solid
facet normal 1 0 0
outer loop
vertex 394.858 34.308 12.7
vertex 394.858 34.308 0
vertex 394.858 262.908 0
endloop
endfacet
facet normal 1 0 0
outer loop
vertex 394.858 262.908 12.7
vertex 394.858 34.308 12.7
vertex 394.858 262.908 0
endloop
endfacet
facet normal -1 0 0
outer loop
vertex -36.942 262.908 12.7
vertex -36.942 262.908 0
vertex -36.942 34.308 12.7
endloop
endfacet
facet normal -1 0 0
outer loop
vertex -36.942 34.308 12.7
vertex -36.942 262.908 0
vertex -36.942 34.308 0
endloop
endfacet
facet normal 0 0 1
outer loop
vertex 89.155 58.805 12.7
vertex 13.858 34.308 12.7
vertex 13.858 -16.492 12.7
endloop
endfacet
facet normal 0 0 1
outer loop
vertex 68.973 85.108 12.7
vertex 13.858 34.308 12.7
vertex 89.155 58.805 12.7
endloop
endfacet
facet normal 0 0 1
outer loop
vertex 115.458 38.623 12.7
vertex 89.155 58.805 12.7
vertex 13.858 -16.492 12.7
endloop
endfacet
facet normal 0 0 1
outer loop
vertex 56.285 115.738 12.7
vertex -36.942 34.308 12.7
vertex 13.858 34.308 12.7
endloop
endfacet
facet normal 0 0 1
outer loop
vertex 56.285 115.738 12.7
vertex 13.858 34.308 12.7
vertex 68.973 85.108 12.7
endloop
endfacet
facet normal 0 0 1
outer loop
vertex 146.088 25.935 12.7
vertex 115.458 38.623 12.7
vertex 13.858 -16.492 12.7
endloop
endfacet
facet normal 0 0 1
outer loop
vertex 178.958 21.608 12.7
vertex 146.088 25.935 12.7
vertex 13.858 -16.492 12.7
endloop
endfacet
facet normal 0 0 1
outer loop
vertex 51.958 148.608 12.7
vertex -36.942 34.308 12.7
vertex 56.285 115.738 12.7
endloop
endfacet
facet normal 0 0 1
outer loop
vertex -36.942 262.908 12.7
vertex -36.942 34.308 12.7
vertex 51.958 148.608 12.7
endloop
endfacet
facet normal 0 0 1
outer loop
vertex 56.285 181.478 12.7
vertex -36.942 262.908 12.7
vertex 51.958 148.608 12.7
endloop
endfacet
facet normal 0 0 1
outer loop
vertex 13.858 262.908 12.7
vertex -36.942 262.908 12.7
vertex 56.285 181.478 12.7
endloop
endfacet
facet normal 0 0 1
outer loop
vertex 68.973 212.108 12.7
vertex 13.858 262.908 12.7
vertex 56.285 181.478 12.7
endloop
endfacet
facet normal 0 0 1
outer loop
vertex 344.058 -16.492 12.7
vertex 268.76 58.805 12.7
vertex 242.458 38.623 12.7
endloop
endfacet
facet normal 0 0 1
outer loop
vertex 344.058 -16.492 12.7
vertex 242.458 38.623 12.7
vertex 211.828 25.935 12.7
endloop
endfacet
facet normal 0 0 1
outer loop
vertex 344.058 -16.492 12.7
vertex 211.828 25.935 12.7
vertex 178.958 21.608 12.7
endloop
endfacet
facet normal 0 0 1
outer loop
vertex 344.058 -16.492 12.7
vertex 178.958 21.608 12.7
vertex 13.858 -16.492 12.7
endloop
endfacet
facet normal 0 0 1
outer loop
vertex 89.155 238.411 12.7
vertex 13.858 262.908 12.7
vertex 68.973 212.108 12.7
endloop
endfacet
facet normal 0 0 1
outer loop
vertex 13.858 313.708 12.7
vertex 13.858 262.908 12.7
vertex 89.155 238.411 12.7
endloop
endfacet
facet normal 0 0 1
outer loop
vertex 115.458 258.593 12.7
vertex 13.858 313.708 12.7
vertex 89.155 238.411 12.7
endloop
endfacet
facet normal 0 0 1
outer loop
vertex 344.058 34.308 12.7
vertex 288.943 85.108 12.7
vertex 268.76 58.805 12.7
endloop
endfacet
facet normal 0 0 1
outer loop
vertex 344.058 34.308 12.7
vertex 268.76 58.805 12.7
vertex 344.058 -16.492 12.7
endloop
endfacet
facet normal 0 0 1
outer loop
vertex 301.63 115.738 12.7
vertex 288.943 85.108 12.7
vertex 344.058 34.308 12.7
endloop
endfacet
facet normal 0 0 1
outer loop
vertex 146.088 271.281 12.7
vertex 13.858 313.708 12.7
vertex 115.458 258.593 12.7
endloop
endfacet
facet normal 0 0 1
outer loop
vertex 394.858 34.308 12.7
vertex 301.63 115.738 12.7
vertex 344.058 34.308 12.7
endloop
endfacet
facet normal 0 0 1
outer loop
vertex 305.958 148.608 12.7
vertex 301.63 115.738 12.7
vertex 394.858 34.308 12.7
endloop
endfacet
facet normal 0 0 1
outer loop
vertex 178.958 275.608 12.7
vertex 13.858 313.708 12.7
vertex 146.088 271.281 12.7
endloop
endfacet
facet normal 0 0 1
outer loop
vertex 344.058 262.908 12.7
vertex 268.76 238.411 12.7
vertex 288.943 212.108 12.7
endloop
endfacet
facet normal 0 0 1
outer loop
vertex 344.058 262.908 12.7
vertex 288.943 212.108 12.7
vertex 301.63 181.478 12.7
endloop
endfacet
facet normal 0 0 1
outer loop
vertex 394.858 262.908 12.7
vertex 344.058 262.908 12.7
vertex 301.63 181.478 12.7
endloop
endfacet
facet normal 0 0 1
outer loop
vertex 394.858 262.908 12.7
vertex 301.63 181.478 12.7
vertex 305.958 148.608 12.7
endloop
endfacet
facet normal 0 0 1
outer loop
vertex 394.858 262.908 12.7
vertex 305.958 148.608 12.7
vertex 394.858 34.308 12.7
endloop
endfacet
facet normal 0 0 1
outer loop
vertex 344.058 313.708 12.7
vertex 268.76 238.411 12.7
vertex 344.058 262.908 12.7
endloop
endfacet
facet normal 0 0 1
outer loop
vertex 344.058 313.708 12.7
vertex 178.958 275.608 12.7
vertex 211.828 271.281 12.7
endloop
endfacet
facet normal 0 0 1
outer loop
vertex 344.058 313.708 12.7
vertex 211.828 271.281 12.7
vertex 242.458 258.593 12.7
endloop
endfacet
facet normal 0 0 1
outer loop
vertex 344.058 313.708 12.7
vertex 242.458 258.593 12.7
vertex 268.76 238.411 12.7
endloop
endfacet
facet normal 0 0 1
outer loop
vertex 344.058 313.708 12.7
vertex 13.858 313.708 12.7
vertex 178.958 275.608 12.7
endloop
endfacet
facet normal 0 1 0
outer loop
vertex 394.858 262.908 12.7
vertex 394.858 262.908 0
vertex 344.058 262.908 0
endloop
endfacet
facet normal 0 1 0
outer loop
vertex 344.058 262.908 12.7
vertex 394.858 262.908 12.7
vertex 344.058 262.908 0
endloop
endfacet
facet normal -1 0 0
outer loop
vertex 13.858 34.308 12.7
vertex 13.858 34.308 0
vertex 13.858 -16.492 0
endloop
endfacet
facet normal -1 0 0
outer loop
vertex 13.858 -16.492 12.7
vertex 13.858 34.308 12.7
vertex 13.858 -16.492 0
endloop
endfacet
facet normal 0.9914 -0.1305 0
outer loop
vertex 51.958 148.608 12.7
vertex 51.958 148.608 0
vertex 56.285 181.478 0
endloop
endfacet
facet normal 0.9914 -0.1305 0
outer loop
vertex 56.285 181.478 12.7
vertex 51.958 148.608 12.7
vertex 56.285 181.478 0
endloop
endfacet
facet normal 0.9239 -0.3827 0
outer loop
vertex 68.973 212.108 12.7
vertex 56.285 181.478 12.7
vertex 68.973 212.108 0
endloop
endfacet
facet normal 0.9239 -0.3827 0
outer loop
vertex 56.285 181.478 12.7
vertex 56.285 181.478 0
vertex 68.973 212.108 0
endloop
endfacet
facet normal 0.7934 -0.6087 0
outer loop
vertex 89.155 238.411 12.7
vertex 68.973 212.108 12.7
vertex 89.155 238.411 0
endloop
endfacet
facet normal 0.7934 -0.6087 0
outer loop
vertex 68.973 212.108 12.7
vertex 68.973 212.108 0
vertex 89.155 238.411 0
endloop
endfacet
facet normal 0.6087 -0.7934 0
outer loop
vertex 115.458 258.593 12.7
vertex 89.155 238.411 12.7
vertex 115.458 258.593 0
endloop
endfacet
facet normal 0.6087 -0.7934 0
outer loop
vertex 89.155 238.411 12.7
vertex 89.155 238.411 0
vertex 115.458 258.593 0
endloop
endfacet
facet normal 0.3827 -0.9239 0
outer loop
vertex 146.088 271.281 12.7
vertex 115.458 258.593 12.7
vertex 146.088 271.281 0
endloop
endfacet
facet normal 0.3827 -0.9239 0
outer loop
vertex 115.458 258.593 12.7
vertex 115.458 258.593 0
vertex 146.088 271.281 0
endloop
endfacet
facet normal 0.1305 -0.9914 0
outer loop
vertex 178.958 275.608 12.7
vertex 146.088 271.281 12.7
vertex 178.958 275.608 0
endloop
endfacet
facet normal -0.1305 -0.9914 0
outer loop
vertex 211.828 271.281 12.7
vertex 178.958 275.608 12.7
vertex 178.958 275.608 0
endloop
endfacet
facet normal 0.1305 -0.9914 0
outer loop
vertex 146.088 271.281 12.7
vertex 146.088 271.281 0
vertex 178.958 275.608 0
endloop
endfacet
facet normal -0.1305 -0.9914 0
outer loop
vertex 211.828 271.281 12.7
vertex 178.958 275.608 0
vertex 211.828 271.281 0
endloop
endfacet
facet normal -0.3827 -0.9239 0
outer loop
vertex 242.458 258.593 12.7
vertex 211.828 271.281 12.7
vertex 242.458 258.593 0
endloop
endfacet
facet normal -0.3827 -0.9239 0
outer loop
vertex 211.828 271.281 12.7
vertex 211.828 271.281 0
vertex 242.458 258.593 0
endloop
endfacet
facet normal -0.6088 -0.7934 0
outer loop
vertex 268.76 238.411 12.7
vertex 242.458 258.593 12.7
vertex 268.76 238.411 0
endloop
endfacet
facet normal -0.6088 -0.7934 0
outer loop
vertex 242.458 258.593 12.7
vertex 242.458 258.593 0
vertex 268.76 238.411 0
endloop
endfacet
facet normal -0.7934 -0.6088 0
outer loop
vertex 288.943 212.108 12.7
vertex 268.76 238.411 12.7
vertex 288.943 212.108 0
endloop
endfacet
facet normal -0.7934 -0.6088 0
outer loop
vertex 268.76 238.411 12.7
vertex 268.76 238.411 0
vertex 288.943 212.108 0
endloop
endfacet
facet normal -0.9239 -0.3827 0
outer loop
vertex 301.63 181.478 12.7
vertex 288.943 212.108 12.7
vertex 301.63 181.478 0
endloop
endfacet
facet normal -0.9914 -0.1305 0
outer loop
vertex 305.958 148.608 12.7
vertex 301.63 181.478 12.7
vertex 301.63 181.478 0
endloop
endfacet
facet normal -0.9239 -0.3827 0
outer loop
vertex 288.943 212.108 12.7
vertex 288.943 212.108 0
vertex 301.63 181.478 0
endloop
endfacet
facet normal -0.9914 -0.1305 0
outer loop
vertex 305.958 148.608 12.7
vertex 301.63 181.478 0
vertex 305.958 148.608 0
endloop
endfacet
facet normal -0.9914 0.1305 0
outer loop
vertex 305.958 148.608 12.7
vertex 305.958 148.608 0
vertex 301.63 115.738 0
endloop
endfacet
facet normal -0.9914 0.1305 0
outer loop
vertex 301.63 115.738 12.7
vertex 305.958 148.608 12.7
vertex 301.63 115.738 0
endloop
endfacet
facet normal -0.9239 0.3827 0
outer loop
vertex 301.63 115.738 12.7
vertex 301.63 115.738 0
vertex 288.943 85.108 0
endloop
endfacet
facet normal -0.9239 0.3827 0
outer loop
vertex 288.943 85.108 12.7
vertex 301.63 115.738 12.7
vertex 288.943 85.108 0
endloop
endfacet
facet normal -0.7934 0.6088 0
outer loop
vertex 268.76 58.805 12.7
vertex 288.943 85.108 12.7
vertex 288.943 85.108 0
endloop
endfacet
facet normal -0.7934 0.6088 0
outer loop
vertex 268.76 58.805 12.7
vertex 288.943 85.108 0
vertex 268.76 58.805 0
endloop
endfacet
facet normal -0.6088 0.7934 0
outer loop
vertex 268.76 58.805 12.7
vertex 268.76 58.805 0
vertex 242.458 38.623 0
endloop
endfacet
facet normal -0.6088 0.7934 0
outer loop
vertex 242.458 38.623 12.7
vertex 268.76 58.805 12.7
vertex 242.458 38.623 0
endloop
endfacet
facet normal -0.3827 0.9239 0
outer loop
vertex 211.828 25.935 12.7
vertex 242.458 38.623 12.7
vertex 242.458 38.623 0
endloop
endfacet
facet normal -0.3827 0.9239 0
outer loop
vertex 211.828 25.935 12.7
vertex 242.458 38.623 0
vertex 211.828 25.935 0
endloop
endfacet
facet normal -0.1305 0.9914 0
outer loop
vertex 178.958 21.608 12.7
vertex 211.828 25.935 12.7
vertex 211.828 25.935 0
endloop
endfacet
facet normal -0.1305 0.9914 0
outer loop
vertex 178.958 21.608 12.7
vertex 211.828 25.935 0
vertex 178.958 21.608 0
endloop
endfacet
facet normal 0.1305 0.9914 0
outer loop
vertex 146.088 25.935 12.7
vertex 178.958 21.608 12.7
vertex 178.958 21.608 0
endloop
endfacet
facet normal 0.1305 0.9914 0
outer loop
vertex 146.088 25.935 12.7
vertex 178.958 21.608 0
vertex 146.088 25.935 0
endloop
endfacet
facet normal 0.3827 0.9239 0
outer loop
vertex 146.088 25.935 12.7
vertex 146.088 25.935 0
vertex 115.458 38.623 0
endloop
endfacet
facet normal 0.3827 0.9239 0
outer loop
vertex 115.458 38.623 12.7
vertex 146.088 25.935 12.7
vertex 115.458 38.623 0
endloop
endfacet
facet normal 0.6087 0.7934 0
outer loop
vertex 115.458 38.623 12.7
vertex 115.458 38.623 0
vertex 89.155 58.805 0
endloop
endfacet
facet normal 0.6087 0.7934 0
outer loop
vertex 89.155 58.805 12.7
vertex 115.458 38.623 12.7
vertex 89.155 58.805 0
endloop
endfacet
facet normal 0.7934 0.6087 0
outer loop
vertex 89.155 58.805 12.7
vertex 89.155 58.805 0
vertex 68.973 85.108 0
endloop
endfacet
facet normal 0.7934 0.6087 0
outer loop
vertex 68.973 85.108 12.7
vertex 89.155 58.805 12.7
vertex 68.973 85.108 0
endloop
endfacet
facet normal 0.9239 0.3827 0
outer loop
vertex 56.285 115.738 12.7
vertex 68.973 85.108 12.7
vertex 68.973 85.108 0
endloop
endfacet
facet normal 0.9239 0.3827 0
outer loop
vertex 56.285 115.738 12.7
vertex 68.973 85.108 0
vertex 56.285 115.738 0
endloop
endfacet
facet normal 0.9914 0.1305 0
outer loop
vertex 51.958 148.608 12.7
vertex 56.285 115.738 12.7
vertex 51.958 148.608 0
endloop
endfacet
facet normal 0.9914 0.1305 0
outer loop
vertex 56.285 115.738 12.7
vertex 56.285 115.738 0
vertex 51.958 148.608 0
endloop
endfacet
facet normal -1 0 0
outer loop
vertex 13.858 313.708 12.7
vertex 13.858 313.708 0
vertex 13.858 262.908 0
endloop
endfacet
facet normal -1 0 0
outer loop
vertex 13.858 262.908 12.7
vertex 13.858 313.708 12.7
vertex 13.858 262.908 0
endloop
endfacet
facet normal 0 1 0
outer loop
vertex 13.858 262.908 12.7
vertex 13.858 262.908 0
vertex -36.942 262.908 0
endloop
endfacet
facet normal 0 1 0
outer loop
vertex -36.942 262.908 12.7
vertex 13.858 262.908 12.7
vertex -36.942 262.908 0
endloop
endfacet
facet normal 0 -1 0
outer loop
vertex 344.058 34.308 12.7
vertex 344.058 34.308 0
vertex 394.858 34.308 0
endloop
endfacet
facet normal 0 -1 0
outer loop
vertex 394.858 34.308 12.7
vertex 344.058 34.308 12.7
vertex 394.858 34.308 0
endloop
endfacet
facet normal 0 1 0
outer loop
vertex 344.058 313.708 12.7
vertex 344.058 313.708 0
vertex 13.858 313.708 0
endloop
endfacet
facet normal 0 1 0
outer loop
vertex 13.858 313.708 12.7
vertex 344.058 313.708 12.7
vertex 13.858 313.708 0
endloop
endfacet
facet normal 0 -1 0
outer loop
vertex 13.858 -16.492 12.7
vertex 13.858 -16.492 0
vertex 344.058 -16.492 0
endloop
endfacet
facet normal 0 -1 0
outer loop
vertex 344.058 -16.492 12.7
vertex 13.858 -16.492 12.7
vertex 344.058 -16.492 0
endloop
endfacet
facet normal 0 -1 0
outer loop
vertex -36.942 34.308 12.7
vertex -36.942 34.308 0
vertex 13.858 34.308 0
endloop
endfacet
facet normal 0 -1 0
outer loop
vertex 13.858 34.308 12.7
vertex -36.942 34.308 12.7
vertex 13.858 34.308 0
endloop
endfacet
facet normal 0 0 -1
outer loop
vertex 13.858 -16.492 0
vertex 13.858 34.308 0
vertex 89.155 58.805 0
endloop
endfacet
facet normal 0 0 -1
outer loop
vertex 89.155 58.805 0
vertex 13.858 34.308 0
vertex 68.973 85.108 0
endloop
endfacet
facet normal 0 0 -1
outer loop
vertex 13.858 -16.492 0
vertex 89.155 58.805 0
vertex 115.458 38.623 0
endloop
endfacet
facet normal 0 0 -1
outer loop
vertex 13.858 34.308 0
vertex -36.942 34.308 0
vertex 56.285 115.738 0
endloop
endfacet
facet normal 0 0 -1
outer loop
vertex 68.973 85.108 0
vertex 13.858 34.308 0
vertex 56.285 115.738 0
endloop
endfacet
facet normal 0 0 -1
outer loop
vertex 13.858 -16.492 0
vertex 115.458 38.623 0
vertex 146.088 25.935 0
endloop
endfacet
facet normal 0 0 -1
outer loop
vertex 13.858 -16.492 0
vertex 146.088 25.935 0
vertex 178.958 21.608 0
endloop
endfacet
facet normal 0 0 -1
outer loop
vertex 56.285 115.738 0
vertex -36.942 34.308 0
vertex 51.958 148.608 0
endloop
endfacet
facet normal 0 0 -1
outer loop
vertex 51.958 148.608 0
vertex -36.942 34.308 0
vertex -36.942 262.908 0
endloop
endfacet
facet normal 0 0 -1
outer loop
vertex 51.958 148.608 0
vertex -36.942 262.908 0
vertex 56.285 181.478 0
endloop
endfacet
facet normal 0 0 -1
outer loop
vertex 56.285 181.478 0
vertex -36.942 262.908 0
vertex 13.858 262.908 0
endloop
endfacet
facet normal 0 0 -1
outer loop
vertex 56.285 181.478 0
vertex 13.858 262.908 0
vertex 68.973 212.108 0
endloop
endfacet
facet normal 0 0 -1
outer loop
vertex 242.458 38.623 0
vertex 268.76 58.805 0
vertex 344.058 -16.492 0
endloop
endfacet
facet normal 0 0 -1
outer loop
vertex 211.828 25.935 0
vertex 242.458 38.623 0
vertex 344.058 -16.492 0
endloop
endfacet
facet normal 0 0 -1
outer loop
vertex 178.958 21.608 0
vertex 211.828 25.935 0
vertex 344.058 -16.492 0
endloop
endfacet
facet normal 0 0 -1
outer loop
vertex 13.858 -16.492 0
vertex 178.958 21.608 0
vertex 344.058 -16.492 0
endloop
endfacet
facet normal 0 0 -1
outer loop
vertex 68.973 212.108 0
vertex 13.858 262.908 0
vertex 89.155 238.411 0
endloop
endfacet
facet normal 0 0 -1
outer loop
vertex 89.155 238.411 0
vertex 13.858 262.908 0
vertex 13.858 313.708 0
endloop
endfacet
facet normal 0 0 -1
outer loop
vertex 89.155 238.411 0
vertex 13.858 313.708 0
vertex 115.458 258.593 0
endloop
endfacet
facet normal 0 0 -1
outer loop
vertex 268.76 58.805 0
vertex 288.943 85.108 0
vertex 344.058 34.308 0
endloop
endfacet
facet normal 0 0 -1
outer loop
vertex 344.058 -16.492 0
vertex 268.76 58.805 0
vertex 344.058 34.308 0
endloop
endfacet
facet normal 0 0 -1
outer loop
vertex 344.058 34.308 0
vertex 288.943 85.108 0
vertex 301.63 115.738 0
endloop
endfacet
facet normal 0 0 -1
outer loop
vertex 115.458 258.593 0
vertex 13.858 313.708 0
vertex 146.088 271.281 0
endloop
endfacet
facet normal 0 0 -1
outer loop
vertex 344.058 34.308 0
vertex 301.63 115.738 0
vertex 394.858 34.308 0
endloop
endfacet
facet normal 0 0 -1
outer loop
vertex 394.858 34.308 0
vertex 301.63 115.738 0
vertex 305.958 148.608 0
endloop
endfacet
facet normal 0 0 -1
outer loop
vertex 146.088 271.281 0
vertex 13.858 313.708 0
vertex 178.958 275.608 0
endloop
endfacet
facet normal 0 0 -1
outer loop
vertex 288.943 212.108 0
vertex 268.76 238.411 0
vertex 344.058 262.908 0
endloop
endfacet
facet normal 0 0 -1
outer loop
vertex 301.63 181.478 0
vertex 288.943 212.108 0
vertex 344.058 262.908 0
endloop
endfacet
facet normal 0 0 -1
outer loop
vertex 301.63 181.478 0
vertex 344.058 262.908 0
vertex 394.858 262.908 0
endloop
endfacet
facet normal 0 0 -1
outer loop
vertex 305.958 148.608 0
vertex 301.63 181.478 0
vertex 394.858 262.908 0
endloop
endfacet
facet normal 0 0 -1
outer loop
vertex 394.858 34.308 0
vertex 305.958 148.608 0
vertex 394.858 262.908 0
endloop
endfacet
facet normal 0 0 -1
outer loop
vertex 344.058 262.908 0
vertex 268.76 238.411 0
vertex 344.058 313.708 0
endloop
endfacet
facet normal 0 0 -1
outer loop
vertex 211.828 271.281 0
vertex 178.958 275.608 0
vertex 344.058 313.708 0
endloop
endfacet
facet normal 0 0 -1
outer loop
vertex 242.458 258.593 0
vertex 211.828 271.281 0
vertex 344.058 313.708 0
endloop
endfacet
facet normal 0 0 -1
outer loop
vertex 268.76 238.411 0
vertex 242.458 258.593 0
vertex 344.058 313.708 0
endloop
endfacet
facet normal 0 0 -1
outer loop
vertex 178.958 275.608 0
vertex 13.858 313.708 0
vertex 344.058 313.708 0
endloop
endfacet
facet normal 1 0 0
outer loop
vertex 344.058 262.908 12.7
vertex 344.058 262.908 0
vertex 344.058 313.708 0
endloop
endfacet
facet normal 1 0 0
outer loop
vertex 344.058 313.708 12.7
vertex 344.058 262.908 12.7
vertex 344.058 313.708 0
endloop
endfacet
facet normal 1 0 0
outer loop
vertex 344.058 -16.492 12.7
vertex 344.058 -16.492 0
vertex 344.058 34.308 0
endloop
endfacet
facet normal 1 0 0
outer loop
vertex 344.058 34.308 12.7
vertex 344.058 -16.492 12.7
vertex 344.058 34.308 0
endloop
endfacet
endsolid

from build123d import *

# Parameters (mm, degrees)
F1_DEPTH = 12.7
F3_D     = 254


with BuildPart() as f1:
    # F0 (on Top) → F1 (new body)
    with BuildSketch(Plane.XY):
        Polygon((344.057809, 313.70795), (13.857809, 313.70795), (13.857809, 262.90795), (-36.942191, 262.90795), (-36.942191, 34.30795), (13.857809, 34.30795), (13.857809, -16.49205), (344.057809, -16.49205), (344.057809, 34.30795), (394.857809, 34.30795), (394.857809, 262.90795), (344.057809, 262.90795), align=None)
    extrude(amount=F1_DEPTH)

    # F3 (through all)
    with Locations(Plane.XY.offset(12.7)):
        with Locations((178.957809, 148.60795)):
            Hole(F3_D / 2)


solid = f1.part
